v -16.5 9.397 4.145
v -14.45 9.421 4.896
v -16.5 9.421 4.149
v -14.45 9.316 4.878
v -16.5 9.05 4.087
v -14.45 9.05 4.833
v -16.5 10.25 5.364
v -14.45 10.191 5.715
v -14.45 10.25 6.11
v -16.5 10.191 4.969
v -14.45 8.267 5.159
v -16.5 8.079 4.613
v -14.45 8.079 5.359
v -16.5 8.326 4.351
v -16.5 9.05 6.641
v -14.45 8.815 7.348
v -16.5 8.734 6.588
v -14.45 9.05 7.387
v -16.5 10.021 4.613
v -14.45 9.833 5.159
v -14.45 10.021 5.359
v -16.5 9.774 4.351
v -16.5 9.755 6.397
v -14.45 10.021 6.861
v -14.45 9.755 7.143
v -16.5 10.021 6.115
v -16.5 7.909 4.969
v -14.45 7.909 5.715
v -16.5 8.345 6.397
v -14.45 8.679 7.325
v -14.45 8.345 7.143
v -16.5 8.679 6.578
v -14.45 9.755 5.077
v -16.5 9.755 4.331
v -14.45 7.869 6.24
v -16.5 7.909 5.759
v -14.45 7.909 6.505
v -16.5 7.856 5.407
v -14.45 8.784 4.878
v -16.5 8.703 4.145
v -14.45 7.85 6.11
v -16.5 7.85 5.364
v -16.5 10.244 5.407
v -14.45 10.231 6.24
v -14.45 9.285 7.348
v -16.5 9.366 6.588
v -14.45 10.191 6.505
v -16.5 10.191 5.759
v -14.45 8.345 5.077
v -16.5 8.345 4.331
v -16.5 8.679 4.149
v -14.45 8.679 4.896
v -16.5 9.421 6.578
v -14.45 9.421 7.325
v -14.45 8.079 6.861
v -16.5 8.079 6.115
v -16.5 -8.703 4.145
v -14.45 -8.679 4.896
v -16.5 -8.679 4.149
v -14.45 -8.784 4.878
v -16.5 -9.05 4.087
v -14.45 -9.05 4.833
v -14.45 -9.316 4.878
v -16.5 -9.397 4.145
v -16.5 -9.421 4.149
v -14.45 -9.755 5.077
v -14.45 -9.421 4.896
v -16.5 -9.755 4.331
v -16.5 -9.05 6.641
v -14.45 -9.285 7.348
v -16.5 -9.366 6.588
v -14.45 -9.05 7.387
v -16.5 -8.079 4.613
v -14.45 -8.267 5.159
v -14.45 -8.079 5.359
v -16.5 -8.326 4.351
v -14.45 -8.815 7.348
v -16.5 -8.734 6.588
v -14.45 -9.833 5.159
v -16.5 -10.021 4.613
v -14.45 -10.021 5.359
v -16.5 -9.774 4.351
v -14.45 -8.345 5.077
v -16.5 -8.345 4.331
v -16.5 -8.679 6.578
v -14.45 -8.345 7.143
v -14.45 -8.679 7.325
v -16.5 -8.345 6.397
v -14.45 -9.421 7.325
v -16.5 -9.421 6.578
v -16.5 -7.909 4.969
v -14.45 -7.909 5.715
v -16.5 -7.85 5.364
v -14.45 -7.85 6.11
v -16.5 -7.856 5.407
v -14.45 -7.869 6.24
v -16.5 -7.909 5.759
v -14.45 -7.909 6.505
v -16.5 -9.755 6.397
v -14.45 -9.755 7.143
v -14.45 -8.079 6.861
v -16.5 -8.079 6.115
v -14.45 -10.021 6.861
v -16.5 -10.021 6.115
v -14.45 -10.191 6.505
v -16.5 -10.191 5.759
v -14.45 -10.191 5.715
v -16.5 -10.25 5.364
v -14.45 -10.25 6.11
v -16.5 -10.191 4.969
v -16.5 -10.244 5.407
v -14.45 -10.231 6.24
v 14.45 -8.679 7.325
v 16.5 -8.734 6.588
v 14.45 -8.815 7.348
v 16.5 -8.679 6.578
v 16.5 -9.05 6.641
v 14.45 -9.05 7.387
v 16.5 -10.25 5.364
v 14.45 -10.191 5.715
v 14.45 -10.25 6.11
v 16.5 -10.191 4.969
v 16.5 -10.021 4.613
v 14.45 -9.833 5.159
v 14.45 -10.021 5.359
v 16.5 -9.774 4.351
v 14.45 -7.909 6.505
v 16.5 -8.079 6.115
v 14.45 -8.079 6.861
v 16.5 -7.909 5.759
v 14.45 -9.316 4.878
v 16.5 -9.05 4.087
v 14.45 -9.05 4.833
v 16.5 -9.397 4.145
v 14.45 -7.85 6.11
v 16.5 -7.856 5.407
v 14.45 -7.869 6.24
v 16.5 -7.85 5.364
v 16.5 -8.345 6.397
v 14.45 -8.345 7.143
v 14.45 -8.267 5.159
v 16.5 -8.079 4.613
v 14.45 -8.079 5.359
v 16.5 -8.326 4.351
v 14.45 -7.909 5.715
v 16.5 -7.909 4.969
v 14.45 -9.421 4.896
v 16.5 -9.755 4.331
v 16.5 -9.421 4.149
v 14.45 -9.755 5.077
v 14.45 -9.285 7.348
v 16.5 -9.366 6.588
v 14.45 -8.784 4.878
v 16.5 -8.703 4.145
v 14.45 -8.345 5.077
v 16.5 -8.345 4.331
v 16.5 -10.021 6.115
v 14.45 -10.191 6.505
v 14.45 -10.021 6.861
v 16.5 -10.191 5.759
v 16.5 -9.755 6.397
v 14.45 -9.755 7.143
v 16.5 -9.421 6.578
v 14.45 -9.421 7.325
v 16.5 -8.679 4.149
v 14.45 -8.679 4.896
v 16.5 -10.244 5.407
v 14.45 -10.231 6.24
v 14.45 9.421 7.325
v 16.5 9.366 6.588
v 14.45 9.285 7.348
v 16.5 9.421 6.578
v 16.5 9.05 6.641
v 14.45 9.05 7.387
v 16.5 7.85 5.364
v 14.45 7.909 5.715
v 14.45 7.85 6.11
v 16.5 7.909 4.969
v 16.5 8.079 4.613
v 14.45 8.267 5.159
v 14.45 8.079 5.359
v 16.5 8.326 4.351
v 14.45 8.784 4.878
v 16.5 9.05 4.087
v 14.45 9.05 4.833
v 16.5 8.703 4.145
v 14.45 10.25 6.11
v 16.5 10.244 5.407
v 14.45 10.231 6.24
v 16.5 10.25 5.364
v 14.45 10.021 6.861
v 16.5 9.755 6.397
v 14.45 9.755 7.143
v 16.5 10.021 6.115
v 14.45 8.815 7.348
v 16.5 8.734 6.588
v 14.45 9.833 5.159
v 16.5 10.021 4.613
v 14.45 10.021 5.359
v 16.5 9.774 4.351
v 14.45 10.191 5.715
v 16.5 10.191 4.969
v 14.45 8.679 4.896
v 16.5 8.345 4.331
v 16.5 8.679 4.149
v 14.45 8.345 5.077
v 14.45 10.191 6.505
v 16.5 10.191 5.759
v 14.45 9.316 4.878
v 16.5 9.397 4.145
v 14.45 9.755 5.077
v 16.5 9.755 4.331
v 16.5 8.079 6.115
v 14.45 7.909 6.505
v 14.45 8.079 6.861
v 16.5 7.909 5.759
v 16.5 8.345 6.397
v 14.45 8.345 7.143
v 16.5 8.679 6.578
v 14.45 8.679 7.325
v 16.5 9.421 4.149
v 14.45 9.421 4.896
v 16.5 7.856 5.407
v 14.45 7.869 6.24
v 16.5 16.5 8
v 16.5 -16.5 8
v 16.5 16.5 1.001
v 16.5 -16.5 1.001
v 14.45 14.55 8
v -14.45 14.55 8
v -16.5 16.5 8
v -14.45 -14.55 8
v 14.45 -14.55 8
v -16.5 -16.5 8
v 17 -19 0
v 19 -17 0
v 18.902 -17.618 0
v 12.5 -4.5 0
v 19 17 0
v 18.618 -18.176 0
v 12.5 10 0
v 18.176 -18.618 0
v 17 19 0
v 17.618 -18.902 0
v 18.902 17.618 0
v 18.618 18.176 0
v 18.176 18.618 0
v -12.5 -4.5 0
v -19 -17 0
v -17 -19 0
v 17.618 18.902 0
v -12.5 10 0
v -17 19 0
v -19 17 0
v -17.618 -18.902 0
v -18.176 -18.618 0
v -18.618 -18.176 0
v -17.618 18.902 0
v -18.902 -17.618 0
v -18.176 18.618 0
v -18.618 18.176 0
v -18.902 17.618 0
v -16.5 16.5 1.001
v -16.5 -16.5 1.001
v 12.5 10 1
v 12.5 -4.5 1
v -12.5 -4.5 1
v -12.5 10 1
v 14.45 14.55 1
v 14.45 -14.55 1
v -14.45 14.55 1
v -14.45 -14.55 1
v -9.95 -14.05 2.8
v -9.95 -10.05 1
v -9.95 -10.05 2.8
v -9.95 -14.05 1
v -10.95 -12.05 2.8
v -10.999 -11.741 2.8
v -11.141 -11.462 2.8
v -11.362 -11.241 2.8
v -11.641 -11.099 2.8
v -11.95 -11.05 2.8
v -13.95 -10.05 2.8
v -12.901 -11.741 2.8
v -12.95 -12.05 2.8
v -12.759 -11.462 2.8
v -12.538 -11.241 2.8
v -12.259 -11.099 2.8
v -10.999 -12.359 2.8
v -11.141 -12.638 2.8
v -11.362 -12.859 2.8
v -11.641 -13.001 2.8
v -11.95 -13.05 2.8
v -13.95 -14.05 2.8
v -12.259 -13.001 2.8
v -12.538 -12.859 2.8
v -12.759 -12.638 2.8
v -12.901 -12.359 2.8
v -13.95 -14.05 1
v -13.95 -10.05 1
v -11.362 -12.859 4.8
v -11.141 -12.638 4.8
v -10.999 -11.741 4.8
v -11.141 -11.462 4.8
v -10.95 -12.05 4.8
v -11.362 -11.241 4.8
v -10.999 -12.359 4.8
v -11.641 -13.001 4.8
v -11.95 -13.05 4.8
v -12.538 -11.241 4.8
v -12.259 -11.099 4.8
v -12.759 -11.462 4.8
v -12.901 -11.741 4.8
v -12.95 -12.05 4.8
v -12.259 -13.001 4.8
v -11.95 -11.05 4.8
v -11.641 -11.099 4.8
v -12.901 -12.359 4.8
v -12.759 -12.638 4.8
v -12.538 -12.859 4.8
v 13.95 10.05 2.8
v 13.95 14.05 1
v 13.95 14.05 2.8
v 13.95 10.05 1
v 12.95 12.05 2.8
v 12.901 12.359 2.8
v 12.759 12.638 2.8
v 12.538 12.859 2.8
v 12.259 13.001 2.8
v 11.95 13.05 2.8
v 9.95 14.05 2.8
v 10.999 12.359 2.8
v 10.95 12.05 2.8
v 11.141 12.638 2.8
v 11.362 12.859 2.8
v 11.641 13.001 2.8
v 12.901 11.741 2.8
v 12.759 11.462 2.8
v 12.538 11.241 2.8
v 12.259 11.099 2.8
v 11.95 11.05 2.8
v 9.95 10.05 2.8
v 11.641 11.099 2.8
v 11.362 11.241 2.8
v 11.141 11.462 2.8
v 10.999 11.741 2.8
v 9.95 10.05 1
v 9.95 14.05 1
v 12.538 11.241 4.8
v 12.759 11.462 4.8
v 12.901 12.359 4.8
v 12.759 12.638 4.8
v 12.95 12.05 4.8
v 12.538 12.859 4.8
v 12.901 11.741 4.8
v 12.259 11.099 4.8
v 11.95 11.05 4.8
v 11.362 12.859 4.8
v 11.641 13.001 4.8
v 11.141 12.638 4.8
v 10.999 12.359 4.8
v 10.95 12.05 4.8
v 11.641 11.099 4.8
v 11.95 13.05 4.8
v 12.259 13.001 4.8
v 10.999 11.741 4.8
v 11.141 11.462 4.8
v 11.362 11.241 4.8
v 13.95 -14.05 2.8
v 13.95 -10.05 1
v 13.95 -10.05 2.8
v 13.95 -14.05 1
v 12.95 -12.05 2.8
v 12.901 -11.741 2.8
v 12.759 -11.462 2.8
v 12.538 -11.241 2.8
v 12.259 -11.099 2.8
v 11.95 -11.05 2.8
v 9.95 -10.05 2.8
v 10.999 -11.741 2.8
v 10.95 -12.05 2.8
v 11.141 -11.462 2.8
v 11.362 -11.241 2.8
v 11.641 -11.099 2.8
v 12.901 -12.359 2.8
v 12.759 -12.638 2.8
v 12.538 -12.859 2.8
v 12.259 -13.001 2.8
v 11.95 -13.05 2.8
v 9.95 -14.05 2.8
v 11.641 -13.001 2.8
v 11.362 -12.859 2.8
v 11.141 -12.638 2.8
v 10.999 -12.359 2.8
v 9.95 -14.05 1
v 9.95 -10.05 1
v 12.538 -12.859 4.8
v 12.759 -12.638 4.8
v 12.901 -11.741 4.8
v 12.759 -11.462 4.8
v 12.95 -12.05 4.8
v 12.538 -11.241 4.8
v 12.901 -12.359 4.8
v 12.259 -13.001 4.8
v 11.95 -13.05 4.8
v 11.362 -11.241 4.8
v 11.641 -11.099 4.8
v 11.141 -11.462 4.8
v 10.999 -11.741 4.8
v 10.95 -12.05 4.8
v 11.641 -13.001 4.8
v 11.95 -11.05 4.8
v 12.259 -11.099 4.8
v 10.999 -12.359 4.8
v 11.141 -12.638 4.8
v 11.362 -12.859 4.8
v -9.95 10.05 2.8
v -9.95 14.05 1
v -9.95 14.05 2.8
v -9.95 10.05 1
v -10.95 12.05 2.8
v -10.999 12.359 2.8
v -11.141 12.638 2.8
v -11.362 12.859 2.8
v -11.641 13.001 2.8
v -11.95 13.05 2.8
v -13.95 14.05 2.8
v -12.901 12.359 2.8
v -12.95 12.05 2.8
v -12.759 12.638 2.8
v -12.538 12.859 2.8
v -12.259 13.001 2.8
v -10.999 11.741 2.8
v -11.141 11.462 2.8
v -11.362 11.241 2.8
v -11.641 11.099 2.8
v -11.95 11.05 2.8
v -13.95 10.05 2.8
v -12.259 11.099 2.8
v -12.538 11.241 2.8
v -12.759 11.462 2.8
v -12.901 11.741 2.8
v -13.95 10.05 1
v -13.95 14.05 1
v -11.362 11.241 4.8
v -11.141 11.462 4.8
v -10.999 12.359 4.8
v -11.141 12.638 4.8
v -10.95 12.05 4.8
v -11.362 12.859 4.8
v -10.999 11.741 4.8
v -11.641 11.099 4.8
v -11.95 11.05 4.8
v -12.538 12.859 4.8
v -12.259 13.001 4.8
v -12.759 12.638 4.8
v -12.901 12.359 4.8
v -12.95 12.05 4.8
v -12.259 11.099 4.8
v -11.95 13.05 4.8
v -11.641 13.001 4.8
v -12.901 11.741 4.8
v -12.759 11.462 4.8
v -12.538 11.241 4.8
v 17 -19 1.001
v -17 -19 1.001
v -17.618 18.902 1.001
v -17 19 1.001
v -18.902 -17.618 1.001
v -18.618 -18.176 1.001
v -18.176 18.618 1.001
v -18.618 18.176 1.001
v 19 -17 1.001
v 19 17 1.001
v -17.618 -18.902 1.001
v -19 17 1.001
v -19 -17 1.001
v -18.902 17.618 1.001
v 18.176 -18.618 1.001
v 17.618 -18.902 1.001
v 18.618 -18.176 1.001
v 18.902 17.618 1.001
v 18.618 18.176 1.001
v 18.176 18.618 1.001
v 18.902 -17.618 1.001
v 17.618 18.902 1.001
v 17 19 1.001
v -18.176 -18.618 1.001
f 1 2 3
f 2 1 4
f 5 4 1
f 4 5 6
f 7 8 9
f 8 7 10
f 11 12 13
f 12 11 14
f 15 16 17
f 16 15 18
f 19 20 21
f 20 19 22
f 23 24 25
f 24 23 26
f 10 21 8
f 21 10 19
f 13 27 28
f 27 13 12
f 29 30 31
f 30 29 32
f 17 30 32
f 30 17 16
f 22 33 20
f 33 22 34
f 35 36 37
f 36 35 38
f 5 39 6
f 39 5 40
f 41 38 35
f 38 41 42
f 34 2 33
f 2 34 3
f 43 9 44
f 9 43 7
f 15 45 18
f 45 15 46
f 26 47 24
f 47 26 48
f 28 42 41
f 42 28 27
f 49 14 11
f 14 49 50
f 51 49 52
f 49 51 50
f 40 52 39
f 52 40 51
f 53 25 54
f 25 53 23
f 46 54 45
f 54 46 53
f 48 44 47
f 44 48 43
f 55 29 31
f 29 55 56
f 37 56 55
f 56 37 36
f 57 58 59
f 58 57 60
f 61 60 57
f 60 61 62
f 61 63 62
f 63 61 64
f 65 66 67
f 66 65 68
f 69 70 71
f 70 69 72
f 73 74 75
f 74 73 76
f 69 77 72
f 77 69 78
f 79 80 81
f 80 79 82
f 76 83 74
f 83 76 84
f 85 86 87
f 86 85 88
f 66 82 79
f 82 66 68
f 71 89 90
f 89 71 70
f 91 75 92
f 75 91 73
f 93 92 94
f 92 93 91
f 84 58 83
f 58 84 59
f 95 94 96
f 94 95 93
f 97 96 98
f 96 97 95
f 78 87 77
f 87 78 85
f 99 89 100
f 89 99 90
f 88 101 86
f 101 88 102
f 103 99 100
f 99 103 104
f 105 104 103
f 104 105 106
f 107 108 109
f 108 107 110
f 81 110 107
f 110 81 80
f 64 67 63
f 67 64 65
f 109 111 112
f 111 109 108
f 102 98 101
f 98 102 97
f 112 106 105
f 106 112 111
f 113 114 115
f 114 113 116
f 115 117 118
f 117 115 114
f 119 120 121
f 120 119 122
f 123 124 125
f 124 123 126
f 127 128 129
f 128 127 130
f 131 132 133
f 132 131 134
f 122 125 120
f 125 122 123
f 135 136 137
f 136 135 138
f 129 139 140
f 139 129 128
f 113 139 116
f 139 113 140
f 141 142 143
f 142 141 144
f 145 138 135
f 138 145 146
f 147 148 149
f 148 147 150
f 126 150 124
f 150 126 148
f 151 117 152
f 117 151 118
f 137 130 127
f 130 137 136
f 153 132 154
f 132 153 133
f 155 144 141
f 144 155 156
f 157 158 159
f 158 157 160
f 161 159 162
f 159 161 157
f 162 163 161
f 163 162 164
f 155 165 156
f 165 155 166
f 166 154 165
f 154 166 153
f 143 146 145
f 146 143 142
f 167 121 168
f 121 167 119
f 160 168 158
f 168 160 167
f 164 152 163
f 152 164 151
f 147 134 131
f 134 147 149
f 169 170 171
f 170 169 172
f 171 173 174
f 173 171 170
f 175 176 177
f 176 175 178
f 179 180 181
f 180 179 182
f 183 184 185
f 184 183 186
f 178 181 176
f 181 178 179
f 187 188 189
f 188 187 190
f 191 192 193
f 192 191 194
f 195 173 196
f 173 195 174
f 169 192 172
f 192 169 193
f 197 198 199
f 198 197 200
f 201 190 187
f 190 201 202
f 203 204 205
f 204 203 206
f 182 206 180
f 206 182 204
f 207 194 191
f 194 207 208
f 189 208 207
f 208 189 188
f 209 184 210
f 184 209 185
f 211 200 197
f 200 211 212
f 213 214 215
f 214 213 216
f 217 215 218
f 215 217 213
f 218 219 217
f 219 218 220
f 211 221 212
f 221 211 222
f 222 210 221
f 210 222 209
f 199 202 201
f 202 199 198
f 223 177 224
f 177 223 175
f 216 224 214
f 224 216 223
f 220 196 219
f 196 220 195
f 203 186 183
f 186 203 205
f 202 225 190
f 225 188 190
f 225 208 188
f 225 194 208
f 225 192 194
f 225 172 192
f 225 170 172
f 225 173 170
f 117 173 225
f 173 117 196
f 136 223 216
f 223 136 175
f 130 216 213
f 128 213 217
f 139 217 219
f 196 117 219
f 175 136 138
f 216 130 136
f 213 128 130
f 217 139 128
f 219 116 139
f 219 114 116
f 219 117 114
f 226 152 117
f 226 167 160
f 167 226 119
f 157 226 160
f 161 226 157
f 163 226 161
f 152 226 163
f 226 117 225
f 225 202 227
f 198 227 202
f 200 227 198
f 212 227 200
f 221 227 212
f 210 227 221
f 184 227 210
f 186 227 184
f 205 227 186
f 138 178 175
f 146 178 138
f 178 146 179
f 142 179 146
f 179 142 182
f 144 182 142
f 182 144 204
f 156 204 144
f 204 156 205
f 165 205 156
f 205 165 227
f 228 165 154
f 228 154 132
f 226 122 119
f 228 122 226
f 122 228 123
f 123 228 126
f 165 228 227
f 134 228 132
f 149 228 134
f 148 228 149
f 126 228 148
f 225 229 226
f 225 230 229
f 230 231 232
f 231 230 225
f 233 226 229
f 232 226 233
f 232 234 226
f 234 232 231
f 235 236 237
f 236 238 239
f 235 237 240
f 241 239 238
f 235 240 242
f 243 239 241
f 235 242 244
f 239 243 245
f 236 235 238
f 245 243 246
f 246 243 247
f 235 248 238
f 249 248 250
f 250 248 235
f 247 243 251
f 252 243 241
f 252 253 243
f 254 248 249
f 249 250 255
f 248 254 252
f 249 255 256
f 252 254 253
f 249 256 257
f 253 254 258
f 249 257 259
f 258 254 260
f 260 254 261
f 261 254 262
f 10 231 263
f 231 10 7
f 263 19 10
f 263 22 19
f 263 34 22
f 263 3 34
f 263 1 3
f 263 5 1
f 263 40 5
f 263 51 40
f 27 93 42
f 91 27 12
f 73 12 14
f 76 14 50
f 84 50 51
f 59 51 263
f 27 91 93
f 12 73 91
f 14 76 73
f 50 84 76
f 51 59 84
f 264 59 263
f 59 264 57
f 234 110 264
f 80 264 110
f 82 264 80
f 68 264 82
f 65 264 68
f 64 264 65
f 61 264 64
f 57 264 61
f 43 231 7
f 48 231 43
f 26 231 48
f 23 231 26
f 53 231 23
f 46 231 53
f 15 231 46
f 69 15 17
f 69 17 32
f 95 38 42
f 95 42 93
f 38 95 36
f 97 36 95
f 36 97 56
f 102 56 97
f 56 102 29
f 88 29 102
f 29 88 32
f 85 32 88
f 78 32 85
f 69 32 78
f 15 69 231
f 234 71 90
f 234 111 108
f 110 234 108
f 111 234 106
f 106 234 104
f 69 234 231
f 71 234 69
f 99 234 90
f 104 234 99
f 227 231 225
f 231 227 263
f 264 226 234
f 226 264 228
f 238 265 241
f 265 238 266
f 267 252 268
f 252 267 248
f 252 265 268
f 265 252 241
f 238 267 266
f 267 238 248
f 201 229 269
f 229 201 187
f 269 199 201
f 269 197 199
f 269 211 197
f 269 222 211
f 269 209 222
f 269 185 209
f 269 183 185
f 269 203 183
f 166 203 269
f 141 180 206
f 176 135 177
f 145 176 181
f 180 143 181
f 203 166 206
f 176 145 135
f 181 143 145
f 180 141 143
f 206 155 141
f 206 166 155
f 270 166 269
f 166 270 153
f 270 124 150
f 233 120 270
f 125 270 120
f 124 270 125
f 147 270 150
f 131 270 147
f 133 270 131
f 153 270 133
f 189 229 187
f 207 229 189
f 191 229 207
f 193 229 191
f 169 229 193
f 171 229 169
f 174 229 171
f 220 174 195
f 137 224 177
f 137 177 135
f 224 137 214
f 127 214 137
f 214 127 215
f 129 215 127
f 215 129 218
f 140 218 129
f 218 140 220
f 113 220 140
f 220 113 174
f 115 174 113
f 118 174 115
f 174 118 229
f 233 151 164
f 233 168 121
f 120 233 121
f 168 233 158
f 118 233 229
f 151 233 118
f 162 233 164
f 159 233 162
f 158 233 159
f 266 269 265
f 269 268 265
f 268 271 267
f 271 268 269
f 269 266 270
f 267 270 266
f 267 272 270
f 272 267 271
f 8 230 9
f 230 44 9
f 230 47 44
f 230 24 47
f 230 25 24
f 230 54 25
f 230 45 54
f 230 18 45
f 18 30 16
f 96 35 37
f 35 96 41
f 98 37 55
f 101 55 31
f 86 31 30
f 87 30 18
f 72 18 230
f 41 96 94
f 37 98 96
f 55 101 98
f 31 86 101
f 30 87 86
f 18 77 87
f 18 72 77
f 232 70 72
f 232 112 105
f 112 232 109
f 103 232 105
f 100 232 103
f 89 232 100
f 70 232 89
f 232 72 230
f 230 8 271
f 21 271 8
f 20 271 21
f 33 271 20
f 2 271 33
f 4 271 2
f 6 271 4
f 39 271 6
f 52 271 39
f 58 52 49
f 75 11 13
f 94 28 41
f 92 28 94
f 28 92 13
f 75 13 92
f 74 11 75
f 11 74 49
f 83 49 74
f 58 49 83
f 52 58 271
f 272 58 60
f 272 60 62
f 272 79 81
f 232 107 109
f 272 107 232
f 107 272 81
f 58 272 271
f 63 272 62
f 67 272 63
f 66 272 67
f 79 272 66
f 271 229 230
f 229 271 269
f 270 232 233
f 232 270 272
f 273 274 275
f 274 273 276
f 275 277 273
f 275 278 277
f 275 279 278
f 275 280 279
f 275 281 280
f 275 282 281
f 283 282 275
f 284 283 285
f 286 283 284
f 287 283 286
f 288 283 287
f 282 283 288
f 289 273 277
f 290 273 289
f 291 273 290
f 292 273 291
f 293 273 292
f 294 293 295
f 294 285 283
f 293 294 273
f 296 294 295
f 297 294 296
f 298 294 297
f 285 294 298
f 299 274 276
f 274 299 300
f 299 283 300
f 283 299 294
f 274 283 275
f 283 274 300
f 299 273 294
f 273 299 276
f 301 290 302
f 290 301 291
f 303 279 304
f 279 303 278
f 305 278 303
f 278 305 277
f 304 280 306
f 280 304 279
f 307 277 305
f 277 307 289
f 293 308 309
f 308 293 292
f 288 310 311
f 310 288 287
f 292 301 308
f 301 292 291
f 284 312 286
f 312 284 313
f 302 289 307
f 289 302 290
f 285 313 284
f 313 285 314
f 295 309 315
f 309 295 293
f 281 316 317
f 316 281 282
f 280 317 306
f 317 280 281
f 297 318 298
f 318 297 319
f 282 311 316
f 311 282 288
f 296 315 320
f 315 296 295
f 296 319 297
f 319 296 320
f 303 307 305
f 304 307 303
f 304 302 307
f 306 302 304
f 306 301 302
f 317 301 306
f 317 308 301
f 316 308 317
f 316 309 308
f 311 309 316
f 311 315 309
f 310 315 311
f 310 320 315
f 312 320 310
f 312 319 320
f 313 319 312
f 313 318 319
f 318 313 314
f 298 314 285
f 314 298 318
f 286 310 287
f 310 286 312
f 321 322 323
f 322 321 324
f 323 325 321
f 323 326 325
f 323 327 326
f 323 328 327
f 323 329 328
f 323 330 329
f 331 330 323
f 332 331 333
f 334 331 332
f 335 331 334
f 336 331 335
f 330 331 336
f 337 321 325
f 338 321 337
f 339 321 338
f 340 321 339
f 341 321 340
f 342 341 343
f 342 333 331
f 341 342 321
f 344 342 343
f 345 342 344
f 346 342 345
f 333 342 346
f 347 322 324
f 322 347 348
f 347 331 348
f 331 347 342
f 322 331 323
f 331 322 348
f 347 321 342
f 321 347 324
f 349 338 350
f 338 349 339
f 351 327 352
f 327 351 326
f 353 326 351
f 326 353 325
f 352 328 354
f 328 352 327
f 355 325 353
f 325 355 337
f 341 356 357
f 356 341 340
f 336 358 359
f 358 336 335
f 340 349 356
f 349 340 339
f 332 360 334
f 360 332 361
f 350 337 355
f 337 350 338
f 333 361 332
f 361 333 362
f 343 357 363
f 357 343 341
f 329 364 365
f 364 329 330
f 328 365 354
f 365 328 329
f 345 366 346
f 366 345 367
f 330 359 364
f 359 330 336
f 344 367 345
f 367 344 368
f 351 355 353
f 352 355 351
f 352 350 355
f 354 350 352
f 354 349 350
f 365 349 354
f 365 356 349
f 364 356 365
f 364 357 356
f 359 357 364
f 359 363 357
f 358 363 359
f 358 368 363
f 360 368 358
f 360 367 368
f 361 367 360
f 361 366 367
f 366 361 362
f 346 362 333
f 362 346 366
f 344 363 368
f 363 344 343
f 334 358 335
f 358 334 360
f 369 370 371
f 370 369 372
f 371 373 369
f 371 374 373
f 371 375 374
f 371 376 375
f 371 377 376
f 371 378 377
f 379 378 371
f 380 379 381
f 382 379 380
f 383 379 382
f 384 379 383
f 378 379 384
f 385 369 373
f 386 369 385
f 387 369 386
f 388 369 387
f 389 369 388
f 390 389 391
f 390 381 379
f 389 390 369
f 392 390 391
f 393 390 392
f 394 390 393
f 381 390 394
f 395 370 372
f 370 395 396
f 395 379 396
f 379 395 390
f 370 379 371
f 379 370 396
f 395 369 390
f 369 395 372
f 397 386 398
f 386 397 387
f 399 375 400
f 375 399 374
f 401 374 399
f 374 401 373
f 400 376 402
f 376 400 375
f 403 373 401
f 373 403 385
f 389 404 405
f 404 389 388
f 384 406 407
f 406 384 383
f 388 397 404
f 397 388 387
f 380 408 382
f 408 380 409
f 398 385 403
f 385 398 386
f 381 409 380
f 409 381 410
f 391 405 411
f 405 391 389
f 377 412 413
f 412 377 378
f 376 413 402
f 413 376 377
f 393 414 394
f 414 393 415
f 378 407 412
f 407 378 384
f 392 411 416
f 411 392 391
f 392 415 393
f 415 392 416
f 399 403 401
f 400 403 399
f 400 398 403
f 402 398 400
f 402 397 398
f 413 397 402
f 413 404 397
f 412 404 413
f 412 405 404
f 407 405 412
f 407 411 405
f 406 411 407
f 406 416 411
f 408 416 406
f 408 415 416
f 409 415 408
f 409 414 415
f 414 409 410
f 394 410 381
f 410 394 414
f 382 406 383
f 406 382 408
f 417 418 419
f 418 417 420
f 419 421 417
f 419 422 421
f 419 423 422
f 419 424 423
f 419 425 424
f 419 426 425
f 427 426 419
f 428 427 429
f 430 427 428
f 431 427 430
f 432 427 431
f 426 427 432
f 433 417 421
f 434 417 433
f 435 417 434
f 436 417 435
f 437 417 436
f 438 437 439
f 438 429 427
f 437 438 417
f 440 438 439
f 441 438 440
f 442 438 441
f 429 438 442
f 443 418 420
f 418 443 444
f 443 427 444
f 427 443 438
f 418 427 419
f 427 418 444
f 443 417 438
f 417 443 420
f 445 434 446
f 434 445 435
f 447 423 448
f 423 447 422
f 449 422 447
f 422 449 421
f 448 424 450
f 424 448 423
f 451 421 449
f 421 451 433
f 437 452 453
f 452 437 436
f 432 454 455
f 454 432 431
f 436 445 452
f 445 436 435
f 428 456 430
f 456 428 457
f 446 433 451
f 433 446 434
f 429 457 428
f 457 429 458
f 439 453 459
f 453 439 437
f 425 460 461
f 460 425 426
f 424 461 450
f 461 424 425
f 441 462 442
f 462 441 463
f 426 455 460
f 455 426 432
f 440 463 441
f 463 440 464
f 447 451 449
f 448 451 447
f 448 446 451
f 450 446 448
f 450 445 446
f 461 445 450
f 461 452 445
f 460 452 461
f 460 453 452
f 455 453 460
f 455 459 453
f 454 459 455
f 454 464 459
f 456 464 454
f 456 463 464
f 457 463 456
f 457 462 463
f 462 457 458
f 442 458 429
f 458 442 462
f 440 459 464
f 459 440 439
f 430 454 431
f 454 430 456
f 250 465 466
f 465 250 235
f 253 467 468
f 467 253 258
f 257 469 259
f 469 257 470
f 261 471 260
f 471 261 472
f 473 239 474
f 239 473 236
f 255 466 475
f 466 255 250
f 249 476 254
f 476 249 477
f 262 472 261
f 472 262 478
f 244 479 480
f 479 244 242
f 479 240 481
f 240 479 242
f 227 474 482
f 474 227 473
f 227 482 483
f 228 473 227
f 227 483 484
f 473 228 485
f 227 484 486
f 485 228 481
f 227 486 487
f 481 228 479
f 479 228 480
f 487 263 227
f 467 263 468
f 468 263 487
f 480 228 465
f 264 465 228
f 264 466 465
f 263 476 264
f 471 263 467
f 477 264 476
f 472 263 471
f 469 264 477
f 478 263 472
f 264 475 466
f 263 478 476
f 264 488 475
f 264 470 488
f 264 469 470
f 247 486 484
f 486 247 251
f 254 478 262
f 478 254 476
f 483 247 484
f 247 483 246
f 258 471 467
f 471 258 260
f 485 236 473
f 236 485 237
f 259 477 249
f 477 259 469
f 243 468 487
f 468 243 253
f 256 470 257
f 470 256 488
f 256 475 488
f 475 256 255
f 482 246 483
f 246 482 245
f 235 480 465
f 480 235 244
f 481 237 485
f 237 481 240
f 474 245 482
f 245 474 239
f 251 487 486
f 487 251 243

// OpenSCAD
// Bezel for tiny Oled 0.96"
// Stiftleiste ist oben

$fn=20;
CLEARANCE=0.3;

WALL_THICKNESS=2.5;

OLED_XLENGTH=27.6 + CLEARANCE;
OLED_YLENGTH=27.8 + CLEARANCE;
OLED_XLEN_VISIBLE=25;
OLED_YLEN_VISIBLE=14.5;
OLED_FromTopToVisible=4.0+WALL_THICKNESS;
OLED_R=1;  // holes on the board

WALL_FRONT=1;
OUTER_LENGTH=WALL_THICKNESS*2 + 28;  // 28 is OLED_XLENGTH rounded up
EDGE_SIZE=4;
EDGE_ZLEN=1.8;

BOX_ZLENGTH=8;
R_SCREW=1.2;


module platform(x,y) {
    translate([x,y,WALL_FRONT+EDGE_ZLEN/2]) {
        cube([EDGE_SIZE, EDGE_SIZE, EDGE_ZLEN], center=true);
        cylinder(r=1,h=2+EDGE_ZLEN/2);
    }
}

module screwHoles() {
translate([-1-OUTER_LENGTH/2,OLED_YLENGTH/2-5,BOX_ZLENGTH-3]) rotate([0,70,0])
    cylinder(r=R_SCREW,h=10);
translate([-1-OUTER_LENGTH/2,-OLED_YLENGTH/2+5,BOX_ZLENGTH-3]) rotate([0,70,0])
    cylinder(r=R_SCREW,h=10);
translate([1+OUTER_LENGTH/2,-OLED_YLENGTH/2+5,BOX_ZLENGTH-3]) rotate([0,-70,0])
    cylinder(r=R_SCREW,h=10);
translate([1+OUTER_LENGTH/2,OLED_YLENGTH/2-5,BOX_ZLENGTH-3]) rotate([0,-70,0])
    cylinder(r=R_SCREW,h=10);
}


difference() {
    translate([0,0,BOX_ZLENGTH/2])
        cube([OUTER_LENGTH,OUTER_LENGTH,BOX_ZLENGTH], center=true);

    translate([0,OUTER_LENGTH/2 - OLED_YLEN_VISIBLE/2 - OLED_FromTopToVisible, 0])
        cube([OLED_XLEN_VISIBLE,OLED_YLEN_VISIBLE,100], center=true);
    translate([0,0,BOX_ZLENGTH/2 + WALL_FRONT])
    cube([OLED_XLENGTH+1, OLED_YLENGTH+1,BOX_ZLENGTH], center=true);
    screwHoles();
}

platform(-OLED_XLENGTH/2+EDGE_SIZE/2, -OLED_YLENGTH/2+EDGE_SIZE/2);
platform(OLED_XLENGTH/2-EDGE_SIZE/2, OLED_YLENGTH/2-EDGE_SIZE/2);
platform(OLED_XLENGTH/2-EDGE_SIZE/2, -OLED_YLENGTH/2+EDGE_SIZE/2);
platform(-OLED_XLENGTH/2+EDGE_SIZE/2, OLED_YLENGTH/2-EDGE_SIZE/2);

difference() {
    translate([0,0,WALL_FRONT/2])
      minkowski() {
        cube([OUTER_LENGTH+1, OUTER_LENGTH+1, WALL_FRONT], center=true);
        cylinder(r=2, h=0.001);
      }

    cube([OUTER_LENGTH,OUTER_LENGTH,BOX_ZLENGTH], center=true);
}
